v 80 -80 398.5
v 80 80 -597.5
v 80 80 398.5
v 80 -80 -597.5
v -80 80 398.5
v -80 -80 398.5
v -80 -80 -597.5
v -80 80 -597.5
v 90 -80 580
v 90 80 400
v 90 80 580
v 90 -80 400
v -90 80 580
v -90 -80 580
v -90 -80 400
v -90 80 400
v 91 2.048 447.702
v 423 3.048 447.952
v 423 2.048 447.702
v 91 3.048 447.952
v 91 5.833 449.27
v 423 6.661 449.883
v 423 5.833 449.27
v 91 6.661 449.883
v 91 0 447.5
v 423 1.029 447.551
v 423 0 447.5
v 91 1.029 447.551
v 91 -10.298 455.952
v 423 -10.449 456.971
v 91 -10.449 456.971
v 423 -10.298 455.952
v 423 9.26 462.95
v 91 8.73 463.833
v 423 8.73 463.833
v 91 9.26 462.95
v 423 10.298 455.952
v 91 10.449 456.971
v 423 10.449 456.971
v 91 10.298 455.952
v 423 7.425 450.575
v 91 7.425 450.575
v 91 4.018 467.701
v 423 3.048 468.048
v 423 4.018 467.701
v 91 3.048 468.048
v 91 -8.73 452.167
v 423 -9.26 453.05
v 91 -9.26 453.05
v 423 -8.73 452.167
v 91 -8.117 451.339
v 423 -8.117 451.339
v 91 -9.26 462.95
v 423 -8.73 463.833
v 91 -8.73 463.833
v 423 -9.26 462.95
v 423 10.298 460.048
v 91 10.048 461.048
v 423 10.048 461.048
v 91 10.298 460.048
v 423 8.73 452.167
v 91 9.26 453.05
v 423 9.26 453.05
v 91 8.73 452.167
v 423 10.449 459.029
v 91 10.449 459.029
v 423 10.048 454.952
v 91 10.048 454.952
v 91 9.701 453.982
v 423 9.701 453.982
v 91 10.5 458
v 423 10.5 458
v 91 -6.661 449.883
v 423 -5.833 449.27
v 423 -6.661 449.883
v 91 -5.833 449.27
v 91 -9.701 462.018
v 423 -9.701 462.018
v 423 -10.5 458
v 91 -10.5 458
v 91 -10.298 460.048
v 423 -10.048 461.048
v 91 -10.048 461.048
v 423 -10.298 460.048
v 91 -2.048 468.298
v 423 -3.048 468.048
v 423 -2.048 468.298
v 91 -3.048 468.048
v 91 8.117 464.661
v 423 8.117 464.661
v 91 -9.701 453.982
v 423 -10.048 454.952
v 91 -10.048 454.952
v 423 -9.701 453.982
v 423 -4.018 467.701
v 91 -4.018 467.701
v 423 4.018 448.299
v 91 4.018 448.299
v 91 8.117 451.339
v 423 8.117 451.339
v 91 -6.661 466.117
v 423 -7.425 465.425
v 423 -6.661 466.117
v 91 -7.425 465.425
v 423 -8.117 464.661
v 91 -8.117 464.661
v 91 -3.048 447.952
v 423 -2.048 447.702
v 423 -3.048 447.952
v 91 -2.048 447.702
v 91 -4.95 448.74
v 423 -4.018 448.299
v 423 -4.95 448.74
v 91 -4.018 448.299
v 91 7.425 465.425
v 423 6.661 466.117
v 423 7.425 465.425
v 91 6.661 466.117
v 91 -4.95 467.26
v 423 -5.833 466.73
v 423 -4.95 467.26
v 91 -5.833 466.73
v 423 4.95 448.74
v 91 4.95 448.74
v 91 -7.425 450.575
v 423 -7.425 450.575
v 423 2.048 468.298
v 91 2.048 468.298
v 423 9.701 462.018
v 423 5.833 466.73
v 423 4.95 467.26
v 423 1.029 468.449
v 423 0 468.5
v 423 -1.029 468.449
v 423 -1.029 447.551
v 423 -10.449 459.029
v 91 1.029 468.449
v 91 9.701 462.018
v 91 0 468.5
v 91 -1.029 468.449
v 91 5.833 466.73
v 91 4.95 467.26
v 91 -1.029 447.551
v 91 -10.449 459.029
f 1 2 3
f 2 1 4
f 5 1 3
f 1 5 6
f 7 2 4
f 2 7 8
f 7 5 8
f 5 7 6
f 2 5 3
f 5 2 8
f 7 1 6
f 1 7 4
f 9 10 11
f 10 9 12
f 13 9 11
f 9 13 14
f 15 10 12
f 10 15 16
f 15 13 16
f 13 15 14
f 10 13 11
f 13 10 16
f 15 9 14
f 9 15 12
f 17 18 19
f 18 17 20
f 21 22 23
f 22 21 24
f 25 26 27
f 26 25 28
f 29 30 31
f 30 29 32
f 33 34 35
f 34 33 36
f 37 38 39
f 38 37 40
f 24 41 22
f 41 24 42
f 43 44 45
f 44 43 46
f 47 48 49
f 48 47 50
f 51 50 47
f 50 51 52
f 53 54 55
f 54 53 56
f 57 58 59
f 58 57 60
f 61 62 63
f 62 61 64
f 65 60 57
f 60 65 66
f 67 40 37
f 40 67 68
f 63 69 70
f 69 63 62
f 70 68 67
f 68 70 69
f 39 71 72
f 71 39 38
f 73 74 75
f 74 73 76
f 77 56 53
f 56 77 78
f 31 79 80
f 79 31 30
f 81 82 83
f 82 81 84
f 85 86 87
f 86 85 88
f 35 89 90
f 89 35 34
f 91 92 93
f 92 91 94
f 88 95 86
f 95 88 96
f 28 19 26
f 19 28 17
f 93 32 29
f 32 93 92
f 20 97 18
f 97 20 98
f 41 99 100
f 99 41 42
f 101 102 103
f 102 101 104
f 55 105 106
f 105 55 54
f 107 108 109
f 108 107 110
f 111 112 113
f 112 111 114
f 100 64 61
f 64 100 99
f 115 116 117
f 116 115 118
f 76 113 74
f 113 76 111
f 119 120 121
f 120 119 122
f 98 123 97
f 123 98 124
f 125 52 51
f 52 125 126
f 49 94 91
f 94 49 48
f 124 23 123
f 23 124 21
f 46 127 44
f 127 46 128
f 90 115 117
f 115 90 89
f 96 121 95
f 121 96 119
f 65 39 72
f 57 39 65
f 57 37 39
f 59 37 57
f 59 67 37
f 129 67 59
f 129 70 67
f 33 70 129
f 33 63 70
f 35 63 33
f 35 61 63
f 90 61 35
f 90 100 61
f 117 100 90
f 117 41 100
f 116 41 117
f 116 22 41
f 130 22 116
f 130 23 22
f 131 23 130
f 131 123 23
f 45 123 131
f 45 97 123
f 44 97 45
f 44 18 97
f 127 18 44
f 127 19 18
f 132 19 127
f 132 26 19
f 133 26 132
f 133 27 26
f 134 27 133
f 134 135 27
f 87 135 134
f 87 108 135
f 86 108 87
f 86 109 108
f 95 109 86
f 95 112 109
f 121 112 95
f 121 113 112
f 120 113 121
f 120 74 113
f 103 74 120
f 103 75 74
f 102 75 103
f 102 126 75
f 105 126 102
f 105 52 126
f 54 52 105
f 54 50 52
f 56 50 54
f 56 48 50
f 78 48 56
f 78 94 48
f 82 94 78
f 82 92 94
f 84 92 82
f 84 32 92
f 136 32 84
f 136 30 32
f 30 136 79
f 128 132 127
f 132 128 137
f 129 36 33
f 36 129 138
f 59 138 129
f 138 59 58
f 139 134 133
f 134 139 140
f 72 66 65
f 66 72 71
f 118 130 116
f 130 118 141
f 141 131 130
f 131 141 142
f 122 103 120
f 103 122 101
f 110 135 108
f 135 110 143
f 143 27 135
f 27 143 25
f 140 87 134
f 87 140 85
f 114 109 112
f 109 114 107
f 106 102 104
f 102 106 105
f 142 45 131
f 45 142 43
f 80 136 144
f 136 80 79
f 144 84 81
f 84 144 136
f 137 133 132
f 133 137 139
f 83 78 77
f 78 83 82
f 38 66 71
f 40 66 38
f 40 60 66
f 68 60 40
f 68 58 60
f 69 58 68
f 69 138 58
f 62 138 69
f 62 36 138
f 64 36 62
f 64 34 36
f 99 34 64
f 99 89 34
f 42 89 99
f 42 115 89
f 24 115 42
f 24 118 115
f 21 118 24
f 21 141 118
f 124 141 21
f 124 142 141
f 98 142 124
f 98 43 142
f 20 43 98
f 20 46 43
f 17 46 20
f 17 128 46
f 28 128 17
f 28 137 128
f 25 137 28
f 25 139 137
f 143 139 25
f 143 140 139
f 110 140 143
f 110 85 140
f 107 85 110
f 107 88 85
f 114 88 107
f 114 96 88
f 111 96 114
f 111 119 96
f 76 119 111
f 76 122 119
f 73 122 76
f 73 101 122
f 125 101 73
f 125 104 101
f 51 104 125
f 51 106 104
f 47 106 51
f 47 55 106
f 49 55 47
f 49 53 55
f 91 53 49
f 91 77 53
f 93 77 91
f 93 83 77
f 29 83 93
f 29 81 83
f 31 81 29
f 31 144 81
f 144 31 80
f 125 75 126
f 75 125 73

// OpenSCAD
// ============================================================================
// Atom Lithography Machine — Parametric OpenSCAD Module (S6.9-01)
// ============================================================================
// part_id           : S6.9-01
// parent_bom_id     : S6.9
// subsystem         : S6
// part_name         : PT420 500 mm ofsetli uzak doner valf kutusu ve L=600 mm esnek He yuksek-basinc hatti (Exp133)
// material          : Al 6061
// temp_stage        : 300 K (tesis)
// vacuum_grade      : 20 bar He
// tolerance         : 20 bar He, He<=1e-9
// computed_mass_kg  : 42.50762
// envelope_mm       : 533.000 x 220.000 x 1190.000
// design_maturity   : M0_M1_DETAILED_CAD_DESIGN_ONLY
// no_lab_measurement: true
// iec61508_certified: false
// semi_s2_certified : false
// Units: millimeters (mm)
// ============================================================================

$fn = 64;

// Nominal bounding envelope parameters (mm)
bbox_x = 533.0000;
bbox_y = 220.0000;
bbox_z = 1190.0000;

// Part-specific parametric dimensions
valve_offset_mm = 500.0;
flex_he_length_mm = 600.0;
box_dx = 180.0;
box_dy = 160.0;
box_dz = 180.0;

// Interface / port parameters (mm)
port_he_uloop_to_pt420_od = 21.000;
port_he_uloop_to_pt420_bore = 15.000;
port_floor_anchor_base_bolts = 4;

module part_S6_9_01() {
  union() {
    // Acoustic floor stand
    translate([0.000, 0.000, -99.500]) cube([160.000, 160.000, 996.000], center=true);
    // PT420 500 mm offset acoustic valve box
    translate([0.000, 0.000, 490.000]) cube([180.000, 160.000, 180.000], center=true);
    // 600 mm braided He U-loop envelope
    translate([257.000, 0.000, 458.000]) rotate([0.000, 90.000, 0.000]) cylinder(d=21.000, h=332.000, center=true);
  }
}

// World assembly mounting transform (global machine frame, mm / deg):
// translate([-1150.000, 0.000, 610.000]) rotate([0.000, 0.000, 0.000]) part_S6_9_01();

part_S6_9_01();
